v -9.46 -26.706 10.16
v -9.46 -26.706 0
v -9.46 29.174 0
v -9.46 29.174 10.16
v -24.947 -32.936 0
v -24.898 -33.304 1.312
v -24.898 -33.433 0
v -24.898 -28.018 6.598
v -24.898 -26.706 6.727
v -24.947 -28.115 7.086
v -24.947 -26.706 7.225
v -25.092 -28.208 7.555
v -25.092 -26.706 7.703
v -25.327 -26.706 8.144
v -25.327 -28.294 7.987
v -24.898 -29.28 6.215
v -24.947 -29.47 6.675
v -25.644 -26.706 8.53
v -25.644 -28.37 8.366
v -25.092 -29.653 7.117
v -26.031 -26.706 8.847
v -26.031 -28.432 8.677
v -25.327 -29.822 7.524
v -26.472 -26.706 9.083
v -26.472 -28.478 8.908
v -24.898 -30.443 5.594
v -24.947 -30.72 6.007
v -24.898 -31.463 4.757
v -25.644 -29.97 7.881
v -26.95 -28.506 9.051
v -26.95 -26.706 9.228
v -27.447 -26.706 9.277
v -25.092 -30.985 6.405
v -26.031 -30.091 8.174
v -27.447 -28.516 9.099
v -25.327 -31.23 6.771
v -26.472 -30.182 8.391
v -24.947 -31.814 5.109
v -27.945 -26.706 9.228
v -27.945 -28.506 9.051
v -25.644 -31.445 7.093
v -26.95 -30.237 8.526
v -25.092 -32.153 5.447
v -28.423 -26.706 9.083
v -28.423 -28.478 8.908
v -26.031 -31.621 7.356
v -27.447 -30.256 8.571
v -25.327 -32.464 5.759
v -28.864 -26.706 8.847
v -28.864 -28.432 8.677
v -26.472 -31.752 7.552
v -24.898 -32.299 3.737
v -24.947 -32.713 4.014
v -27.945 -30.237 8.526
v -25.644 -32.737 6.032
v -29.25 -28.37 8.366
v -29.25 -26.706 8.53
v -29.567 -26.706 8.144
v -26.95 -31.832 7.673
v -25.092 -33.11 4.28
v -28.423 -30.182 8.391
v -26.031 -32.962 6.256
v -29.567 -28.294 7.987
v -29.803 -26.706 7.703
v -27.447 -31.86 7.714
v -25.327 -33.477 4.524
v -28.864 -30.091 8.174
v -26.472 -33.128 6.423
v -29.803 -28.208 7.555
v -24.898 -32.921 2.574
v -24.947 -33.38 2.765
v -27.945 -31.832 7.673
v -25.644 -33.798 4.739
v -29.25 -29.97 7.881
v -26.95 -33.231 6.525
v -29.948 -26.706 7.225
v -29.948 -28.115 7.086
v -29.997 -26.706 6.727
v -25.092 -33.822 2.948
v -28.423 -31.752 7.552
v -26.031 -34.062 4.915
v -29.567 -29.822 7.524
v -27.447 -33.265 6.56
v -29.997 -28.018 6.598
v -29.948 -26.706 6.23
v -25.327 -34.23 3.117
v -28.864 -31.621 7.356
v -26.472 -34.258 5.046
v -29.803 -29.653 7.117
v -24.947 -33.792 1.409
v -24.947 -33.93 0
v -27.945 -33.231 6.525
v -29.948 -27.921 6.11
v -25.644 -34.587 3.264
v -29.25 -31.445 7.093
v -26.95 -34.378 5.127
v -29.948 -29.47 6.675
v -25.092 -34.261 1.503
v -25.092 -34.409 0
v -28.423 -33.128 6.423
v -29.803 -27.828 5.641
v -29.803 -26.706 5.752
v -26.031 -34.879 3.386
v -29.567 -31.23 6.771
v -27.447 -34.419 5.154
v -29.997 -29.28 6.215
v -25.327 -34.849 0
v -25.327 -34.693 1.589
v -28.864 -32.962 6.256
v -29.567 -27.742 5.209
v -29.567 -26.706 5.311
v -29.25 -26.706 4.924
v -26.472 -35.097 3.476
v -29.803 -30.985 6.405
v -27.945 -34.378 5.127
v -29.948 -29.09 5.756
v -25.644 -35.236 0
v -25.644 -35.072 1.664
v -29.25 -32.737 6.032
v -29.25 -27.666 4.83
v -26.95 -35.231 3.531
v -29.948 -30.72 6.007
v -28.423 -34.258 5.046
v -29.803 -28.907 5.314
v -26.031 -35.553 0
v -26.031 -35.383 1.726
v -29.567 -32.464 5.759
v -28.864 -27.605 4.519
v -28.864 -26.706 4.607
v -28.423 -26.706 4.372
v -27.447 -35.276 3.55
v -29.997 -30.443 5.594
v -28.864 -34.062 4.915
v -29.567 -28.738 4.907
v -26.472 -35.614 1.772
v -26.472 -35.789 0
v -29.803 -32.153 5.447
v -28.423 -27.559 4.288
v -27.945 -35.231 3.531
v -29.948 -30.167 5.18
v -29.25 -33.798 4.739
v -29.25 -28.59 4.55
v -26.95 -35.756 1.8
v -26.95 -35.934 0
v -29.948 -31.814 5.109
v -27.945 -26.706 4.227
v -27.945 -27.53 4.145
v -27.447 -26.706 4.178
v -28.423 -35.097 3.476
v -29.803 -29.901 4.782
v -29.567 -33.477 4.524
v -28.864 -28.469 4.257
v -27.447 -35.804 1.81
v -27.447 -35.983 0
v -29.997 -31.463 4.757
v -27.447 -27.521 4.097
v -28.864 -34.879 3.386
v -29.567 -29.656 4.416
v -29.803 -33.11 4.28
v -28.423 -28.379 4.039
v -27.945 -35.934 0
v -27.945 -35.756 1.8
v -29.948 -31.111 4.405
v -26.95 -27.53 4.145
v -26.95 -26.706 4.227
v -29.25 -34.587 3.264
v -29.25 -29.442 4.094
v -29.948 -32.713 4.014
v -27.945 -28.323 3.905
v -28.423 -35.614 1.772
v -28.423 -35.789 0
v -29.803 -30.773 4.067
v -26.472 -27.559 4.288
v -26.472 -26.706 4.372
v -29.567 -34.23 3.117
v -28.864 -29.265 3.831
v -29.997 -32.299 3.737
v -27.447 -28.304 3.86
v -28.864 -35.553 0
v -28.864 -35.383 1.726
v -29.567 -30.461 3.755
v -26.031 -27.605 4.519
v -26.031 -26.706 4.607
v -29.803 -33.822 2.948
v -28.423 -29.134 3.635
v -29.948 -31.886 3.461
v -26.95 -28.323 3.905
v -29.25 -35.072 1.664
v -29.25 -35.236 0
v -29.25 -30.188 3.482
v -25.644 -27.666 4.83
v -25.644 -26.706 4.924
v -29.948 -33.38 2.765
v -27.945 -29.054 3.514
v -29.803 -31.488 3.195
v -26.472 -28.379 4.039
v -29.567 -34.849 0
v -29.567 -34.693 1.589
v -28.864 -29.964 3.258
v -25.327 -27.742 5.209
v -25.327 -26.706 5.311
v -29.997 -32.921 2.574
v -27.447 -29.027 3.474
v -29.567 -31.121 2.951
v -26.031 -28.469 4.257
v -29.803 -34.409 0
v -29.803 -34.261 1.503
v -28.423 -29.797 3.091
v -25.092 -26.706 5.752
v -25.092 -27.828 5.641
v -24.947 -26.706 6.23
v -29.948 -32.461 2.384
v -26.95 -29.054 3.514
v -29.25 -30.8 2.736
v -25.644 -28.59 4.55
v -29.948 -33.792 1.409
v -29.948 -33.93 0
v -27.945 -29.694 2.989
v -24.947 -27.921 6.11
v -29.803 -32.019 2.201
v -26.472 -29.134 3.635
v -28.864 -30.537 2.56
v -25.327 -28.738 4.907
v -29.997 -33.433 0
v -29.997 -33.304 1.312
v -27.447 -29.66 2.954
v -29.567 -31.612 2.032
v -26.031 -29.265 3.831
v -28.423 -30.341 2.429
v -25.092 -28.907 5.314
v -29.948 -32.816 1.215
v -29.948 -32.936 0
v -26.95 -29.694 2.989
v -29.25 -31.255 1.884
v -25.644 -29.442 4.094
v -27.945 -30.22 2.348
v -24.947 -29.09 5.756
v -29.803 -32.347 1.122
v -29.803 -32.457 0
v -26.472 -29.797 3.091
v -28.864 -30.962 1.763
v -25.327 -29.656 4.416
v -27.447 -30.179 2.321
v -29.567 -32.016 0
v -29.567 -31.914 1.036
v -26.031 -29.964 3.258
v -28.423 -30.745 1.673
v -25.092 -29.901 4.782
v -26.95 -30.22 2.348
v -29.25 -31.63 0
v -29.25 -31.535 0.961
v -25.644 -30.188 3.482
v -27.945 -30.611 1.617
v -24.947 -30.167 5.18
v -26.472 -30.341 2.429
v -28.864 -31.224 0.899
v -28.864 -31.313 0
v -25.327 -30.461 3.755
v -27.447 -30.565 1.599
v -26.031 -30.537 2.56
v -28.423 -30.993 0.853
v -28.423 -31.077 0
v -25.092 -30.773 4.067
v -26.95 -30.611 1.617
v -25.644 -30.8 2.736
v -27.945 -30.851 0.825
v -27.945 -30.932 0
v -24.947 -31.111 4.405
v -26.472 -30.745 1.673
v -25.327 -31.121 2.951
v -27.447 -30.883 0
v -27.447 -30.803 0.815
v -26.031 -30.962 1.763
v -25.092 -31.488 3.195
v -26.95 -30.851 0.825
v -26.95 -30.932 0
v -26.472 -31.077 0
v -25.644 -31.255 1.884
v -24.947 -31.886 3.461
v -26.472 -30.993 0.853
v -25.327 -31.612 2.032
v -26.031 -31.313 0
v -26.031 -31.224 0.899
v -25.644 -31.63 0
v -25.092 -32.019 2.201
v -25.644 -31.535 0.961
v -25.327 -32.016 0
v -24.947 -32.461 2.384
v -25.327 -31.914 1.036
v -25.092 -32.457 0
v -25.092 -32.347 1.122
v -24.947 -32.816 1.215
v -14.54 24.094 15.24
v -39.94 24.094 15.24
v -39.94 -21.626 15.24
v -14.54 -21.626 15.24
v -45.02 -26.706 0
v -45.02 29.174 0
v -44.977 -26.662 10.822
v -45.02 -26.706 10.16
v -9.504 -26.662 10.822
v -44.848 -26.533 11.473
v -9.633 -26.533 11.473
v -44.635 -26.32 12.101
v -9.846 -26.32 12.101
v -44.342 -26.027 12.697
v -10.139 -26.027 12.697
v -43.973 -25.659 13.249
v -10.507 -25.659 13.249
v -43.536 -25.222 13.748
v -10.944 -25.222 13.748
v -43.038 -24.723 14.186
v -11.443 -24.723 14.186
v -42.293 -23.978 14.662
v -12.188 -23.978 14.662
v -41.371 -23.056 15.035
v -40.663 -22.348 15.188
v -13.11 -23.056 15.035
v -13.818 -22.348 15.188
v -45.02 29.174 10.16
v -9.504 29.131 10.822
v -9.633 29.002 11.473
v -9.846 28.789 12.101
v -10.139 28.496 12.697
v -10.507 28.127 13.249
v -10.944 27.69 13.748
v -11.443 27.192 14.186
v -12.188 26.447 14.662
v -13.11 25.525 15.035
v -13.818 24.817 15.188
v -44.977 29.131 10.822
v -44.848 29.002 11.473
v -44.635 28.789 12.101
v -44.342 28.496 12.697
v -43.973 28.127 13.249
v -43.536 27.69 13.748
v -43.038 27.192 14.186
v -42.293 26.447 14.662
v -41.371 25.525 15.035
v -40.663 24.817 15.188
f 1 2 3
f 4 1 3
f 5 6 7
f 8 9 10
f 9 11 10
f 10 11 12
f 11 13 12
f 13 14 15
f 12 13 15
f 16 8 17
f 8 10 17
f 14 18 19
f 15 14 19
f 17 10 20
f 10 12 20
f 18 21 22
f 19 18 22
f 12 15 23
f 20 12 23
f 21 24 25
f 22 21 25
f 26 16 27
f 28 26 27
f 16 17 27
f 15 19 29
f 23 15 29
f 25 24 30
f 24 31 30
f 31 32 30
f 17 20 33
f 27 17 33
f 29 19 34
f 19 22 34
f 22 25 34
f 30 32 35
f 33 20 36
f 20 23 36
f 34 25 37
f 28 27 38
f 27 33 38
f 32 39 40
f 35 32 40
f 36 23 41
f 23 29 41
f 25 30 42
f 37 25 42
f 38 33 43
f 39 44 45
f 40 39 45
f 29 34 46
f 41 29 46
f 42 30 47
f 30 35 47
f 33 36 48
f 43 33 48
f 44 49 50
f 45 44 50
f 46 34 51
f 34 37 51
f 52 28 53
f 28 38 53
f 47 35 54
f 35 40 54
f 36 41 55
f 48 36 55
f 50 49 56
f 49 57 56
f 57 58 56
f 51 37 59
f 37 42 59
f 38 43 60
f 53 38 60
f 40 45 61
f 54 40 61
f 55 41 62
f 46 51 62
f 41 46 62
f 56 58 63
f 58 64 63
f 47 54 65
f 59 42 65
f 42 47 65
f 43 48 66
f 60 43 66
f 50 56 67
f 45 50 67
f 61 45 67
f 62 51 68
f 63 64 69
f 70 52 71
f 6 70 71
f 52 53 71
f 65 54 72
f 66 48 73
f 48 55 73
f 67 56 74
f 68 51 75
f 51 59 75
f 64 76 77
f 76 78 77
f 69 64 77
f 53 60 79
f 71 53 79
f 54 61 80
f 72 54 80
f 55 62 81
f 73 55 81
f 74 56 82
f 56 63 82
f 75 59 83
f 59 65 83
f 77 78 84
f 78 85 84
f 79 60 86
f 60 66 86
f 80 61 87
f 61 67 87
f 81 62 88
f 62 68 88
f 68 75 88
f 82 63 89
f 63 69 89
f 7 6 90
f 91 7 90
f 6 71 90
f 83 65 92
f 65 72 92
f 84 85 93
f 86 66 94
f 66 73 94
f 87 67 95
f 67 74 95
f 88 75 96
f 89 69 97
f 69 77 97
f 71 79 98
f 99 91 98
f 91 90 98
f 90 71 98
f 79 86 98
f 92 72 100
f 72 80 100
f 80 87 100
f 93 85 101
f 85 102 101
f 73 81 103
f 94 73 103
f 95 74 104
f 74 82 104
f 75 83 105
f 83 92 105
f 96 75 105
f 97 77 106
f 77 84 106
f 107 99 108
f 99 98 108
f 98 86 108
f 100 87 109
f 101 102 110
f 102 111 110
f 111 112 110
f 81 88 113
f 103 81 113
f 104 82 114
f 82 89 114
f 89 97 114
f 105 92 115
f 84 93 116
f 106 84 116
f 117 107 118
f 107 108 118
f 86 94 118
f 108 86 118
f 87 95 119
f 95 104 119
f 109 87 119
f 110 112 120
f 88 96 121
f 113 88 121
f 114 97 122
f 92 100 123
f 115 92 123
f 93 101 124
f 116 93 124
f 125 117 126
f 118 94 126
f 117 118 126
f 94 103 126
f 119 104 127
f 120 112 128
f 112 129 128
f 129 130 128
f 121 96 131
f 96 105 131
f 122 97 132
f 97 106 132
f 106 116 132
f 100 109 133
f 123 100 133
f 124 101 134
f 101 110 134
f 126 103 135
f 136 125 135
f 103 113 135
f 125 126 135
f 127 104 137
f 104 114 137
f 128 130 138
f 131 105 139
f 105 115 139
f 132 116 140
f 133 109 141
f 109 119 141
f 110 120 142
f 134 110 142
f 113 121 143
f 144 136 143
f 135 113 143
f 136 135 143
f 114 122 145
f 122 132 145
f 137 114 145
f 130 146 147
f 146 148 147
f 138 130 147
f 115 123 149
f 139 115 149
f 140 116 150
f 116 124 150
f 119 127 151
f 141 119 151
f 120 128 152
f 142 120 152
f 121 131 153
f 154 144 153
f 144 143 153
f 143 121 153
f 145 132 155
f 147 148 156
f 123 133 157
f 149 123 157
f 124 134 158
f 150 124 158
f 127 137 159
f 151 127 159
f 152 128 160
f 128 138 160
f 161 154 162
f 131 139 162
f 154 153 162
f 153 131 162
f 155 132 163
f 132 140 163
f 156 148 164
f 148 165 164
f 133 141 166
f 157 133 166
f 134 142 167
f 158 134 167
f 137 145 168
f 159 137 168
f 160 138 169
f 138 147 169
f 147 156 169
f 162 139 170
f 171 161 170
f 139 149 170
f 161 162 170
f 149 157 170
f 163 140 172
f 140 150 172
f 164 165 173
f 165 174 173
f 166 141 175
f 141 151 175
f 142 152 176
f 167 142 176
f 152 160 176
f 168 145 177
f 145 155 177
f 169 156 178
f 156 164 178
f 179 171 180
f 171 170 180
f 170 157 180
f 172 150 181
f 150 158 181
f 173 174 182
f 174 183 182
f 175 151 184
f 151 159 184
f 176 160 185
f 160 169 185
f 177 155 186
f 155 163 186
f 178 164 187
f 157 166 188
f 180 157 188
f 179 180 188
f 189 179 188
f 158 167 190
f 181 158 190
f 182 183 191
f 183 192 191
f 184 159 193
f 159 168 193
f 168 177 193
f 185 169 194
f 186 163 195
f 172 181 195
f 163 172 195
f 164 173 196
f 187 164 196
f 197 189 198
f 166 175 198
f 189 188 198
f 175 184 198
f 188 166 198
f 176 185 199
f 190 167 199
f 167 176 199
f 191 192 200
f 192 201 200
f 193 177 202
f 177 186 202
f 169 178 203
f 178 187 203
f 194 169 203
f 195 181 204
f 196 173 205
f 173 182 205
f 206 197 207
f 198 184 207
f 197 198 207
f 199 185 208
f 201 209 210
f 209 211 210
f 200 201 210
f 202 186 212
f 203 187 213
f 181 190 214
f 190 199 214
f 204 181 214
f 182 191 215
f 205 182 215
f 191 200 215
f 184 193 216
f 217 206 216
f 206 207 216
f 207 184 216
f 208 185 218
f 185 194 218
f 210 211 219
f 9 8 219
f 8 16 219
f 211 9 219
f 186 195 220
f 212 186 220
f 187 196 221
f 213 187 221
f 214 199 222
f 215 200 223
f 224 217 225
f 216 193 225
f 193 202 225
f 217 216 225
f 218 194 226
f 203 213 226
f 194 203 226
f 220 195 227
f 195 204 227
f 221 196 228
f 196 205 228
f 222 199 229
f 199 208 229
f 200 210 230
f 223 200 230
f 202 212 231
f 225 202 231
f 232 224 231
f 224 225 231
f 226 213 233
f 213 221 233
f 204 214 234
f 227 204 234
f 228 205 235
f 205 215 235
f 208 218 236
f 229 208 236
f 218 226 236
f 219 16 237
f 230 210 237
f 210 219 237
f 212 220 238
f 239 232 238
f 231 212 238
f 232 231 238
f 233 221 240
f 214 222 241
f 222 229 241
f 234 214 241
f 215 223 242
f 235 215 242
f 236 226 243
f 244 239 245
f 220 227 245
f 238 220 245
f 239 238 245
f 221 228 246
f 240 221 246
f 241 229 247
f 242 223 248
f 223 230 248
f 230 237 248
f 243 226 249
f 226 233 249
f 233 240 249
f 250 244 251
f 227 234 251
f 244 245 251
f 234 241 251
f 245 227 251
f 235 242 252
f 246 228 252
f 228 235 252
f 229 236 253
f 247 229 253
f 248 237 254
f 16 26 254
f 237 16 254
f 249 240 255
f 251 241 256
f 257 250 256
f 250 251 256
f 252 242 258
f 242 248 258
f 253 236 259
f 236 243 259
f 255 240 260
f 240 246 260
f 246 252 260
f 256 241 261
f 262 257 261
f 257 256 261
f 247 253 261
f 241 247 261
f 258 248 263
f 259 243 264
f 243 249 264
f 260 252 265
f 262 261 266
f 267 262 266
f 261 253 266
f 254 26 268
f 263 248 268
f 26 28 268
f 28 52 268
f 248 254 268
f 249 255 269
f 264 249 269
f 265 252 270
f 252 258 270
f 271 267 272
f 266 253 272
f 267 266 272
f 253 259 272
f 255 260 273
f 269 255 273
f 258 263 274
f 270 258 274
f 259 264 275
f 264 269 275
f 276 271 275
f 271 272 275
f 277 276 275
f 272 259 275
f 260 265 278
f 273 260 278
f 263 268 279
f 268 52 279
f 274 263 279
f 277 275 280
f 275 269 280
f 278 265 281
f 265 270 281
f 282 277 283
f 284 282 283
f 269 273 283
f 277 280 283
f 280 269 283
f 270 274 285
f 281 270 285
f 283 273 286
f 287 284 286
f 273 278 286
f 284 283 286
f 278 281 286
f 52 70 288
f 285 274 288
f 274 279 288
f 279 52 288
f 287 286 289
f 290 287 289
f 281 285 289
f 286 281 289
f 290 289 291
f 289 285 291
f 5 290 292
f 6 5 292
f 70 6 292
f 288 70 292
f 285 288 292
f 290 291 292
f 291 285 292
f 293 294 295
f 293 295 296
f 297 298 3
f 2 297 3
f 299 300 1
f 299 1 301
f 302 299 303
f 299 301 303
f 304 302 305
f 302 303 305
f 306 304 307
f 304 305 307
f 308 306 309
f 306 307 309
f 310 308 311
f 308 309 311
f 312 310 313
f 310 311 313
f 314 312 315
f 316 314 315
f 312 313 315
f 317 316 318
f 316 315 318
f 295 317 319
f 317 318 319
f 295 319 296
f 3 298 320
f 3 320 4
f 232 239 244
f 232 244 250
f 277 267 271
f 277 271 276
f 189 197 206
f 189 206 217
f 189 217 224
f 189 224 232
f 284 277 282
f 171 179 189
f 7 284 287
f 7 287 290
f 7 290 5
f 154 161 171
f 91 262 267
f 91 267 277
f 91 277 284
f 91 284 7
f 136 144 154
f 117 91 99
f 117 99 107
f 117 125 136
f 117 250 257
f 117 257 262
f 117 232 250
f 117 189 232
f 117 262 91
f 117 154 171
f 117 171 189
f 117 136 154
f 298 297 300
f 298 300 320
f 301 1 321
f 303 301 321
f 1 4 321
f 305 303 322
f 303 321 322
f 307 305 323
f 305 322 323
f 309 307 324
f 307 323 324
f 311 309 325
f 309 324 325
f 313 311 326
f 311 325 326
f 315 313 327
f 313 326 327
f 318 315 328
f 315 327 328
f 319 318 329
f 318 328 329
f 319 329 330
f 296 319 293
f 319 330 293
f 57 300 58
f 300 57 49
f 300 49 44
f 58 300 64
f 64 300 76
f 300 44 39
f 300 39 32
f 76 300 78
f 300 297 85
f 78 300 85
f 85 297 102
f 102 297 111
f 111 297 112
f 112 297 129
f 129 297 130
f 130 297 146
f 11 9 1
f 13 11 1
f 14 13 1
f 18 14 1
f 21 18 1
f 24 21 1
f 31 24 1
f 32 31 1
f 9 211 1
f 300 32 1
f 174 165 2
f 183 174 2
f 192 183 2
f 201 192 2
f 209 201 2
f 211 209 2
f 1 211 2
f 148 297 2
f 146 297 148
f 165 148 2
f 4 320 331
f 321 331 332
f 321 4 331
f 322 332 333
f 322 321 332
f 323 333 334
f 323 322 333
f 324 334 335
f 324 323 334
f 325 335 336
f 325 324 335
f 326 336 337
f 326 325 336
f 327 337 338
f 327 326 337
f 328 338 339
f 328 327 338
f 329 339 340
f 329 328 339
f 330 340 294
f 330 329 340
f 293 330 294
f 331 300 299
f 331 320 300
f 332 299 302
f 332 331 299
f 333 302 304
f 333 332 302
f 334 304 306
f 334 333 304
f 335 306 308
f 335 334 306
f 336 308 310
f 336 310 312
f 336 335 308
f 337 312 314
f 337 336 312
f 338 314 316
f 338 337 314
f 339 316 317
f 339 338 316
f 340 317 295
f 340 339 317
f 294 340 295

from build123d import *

# Parameters (mm, degrees)
F0_W     = 35.56
F0_H     = 55.88
F1_DEPTH = 15.24
F2_R     = 5.08
F3_R     = 2.549678
F4_ANGLE = 90


with BuildPart() as f1:
    # F0 (on Top) → F1 (new body)
    with BuildSketch(Plane.XY):
        with Locations((-27.240339, 1.234332)):
            Rectangle(F0_W, F0_H)
    extrude(amount=F1_DEPTH)

    # F2
    f2_edges = [f1.edges().sort_by_distance(p)[0] for p in [
        (-27.240339, 29.174332, 15.24),
        (-45.020339, 1.234332, 15.24),
        (-27.240339, -26.705668, 15.24),
        (-9.460339, 1.234332, 15.24),
    ]]
    fillet(f2_edges, radius=F2_R)

    # F3 (on face) → F4 (revolve)
    with BuildSketch(Plane.XZ.offset(26.705668)):
        with Locations((-27.447378, 6.727298)):
            Circle(F3_R)
    revolve(axis=Axis((-27.240339, -26.705668, 0), (1, 0, 0)), revolution_arc=F4_ANGLE)


solid = f1.part
